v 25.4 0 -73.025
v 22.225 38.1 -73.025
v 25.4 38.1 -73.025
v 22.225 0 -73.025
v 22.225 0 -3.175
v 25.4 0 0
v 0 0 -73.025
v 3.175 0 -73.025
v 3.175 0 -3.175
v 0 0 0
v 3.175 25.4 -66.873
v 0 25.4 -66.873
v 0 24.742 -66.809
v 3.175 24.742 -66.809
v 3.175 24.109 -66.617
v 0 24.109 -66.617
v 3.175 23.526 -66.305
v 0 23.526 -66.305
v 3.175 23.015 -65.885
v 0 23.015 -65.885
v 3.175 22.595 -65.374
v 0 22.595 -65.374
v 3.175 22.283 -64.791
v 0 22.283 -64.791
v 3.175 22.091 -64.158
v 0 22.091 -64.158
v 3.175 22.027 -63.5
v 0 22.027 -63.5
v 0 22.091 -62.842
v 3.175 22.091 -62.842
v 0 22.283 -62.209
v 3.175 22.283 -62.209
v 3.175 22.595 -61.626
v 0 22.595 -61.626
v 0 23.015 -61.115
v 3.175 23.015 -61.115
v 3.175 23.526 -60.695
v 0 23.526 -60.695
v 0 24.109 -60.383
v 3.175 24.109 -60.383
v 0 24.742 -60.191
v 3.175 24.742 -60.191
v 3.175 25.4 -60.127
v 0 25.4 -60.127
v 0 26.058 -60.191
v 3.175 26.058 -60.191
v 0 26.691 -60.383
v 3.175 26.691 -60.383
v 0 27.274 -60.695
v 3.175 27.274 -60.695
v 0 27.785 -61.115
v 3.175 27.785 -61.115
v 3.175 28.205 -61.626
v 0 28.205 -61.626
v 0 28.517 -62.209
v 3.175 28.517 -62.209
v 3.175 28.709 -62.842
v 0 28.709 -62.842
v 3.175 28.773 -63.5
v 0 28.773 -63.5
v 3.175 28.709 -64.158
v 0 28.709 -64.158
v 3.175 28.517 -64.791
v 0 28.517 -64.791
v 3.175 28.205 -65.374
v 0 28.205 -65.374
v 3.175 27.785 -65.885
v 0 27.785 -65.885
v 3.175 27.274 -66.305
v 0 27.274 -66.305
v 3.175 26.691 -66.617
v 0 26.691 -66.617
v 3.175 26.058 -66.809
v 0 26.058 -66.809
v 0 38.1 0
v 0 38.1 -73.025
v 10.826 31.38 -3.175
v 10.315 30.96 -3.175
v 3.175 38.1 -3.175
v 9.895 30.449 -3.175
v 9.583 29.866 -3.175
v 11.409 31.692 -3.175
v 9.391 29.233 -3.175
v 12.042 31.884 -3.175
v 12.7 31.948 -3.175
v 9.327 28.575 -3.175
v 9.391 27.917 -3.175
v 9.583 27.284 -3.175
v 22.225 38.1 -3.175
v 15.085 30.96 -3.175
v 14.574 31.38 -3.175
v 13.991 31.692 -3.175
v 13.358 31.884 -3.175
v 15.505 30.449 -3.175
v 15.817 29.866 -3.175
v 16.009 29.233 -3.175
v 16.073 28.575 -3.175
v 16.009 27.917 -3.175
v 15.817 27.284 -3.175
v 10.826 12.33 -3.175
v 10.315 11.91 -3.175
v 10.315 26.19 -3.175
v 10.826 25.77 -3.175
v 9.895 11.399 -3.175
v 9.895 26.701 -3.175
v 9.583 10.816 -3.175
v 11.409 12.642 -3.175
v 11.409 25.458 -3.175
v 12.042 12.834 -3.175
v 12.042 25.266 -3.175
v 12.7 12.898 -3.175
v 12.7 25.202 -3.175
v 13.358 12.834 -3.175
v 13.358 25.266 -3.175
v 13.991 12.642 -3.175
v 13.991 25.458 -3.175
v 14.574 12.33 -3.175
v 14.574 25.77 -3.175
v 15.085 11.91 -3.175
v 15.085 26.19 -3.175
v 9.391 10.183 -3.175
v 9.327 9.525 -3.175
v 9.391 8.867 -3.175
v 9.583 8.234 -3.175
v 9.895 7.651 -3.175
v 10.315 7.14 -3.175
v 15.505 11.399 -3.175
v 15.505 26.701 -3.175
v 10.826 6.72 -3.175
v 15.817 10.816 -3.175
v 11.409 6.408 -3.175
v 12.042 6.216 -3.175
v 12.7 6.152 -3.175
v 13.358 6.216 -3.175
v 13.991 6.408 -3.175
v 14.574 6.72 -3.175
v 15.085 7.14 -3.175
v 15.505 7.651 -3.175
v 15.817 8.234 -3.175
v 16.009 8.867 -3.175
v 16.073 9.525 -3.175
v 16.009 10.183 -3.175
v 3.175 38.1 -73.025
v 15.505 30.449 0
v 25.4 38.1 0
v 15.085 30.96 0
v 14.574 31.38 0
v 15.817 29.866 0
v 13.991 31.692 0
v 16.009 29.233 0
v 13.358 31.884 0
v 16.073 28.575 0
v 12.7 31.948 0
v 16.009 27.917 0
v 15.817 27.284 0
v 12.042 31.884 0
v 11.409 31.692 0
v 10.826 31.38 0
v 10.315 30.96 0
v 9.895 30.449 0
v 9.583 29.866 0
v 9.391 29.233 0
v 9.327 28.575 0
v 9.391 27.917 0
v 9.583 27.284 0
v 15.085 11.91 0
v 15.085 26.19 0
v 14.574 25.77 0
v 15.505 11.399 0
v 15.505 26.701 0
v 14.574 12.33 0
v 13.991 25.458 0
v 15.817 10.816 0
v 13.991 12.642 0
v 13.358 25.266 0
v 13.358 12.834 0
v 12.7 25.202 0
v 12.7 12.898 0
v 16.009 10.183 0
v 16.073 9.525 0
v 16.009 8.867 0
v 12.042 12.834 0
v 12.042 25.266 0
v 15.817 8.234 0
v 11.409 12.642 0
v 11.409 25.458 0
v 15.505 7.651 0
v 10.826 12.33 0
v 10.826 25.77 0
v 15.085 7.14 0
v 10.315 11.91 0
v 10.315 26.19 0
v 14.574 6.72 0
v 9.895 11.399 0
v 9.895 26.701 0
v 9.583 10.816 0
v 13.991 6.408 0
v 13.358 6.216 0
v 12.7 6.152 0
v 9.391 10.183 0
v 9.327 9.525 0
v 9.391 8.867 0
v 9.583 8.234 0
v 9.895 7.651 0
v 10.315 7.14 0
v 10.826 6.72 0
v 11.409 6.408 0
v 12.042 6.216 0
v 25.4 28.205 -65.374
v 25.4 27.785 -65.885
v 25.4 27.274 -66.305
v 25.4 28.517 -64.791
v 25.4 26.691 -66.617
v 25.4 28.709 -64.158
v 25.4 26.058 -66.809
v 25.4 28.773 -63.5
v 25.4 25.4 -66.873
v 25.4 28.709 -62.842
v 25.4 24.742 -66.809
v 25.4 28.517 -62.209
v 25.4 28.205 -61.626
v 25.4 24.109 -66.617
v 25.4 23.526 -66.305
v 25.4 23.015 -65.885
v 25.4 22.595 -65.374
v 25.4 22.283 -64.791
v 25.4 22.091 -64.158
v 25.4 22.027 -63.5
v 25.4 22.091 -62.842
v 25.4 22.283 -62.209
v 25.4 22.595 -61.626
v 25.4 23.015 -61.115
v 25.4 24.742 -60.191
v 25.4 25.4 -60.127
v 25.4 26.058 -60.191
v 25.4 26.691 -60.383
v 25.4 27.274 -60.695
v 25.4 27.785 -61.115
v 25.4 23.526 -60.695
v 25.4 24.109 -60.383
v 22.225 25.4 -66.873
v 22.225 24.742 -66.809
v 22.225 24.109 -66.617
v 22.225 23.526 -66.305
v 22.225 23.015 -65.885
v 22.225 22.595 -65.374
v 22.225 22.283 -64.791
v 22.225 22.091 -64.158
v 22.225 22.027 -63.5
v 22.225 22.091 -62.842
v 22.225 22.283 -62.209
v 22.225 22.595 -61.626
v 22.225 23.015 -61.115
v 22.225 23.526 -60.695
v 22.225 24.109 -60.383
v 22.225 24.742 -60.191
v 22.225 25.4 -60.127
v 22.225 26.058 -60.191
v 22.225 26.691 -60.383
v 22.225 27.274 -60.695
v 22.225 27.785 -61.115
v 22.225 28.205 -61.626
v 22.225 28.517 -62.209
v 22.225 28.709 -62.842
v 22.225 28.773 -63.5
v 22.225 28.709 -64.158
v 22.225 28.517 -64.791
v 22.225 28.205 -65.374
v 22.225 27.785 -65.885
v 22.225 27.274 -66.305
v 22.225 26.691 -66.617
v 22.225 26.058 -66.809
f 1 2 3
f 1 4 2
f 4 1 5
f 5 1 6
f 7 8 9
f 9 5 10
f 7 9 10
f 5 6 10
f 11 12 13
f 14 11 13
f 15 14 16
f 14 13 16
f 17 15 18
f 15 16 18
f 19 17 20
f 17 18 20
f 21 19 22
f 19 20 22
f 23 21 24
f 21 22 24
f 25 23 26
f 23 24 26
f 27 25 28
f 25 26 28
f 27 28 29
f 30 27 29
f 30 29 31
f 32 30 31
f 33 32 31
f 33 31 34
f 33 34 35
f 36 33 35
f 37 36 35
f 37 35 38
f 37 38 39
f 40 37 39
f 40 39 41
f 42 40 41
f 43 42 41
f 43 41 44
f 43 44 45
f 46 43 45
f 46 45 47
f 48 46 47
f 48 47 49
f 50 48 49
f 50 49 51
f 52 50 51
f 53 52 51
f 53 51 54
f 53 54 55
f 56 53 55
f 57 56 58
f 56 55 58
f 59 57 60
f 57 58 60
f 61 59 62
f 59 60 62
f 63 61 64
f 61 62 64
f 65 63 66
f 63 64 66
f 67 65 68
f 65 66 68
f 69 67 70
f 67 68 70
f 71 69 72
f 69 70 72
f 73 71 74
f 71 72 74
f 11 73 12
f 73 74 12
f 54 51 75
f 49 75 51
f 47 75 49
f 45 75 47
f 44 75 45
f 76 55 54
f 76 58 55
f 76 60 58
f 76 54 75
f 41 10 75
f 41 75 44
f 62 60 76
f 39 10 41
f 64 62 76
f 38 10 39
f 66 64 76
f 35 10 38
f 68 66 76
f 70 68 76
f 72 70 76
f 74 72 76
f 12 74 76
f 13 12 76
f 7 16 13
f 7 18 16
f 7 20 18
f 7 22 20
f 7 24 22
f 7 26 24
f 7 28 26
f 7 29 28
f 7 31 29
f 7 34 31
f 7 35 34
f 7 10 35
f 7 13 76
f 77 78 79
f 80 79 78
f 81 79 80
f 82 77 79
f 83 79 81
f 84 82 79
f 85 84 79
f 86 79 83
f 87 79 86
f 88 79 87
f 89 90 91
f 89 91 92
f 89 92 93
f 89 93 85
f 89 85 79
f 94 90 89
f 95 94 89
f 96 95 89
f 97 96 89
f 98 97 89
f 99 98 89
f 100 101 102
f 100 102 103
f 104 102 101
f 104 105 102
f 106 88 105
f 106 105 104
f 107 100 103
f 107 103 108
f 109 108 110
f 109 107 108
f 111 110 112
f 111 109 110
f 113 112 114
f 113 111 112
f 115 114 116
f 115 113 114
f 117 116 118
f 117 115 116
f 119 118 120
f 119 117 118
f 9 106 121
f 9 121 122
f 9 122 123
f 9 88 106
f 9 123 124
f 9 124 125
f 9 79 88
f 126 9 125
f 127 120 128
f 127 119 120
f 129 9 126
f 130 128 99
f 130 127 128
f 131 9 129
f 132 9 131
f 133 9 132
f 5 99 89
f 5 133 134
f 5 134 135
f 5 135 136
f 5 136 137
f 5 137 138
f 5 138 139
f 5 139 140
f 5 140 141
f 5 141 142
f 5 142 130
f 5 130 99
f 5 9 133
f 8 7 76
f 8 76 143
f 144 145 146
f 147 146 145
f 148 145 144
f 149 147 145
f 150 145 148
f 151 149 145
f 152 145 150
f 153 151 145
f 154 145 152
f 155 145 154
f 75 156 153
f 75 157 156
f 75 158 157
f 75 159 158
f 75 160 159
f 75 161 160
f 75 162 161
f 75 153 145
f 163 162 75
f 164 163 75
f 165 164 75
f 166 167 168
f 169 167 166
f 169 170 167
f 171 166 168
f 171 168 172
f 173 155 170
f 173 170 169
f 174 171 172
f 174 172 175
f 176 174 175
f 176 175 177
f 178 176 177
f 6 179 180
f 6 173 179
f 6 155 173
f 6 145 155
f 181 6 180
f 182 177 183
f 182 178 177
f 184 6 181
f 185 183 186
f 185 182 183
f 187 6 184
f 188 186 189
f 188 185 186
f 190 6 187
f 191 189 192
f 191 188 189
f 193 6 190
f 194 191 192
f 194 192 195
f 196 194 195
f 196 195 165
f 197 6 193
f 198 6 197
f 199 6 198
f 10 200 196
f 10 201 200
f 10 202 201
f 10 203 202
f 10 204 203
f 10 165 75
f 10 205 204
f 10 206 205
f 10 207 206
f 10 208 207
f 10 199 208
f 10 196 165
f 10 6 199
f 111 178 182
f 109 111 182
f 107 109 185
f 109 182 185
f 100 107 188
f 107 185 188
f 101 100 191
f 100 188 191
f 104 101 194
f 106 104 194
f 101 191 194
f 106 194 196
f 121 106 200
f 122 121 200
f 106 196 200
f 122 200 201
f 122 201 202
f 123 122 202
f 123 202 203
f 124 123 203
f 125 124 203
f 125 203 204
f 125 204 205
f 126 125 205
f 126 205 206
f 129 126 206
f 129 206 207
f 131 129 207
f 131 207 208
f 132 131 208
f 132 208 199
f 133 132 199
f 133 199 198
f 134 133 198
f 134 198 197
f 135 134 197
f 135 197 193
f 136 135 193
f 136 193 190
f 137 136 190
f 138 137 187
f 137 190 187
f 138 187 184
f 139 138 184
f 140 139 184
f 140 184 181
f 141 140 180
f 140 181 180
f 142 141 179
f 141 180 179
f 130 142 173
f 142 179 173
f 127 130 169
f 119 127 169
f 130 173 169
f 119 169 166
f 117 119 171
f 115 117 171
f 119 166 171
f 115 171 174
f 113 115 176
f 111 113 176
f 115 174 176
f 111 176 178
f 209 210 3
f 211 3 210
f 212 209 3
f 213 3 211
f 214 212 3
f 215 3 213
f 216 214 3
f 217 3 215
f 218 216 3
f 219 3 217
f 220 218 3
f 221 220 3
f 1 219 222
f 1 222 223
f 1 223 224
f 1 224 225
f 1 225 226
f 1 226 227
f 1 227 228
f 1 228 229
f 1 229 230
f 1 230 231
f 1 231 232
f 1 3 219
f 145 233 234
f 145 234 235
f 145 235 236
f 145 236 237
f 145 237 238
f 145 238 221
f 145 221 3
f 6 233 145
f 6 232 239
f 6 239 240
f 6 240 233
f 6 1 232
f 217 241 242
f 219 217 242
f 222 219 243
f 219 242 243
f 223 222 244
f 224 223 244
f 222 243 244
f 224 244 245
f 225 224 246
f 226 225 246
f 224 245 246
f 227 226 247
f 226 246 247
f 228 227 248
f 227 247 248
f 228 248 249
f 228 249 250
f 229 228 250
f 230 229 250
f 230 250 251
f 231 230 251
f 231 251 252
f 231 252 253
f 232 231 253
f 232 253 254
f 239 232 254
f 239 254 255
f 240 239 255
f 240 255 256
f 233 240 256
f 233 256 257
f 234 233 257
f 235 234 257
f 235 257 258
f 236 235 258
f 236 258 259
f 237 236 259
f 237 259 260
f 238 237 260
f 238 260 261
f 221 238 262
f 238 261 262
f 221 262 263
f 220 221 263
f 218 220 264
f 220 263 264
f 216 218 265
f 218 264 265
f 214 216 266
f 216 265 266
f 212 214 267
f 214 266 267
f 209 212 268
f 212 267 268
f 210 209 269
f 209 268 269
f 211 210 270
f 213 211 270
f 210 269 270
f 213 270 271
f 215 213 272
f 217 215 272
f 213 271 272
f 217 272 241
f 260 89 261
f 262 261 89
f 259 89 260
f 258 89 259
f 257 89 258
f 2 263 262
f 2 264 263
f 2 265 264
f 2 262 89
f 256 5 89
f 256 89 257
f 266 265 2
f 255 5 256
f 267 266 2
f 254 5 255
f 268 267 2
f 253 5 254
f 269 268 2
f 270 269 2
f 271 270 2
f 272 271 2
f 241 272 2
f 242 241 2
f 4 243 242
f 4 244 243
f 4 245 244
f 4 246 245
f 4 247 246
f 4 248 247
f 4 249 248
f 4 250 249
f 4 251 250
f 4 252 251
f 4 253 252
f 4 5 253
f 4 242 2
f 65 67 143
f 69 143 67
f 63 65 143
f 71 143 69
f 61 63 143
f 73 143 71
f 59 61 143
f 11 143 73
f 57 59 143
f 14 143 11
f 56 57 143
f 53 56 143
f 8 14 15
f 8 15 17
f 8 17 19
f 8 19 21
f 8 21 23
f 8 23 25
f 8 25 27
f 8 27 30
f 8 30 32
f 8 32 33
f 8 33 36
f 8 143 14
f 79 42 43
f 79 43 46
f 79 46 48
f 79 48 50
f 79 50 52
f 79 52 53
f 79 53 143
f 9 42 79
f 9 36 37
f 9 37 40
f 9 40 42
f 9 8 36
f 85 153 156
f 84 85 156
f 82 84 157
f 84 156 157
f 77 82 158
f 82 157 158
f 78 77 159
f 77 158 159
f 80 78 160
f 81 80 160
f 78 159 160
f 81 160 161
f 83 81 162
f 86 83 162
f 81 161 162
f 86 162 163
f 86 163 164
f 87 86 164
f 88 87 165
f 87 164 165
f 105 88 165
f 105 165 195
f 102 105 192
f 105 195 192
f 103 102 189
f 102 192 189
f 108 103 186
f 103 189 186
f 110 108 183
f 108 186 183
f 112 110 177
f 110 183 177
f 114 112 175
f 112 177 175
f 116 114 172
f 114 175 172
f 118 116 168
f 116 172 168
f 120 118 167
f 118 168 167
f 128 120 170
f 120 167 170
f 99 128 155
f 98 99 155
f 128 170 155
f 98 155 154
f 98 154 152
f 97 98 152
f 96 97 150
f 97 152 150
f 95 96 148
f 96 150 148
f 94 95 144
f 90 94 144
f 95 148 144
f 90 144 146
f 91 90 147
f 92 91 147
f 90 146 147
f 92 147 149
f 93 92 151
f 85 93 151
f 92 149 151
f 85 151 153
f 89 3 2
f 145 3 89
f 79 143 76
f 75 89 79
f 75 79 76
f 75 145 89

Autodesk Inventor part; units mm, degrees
ref_plane "YZ Plane" through (0, 0, 0) normal (1, 0, 0) x (0, 1, 0)
ref_plane "XZ Plane" through (0, 0, 0) normal (0, 1, 0) x (-1, 0, 0)
ref_plane "XY Plane" through (0, 0, 0) normal (0, 0, 1) x (1, 0, 0)
sketch "Sketch1" plane through (0, 0, 0) normal (0, 1, 0) x (-1, 0, 0)
  line L0 (0, 0) -> (0, -73.025)
  line L1 (0, -73.025) -> (-3.175, -73.025)
  line L2 (-3.175, -73.025) -> (-3.175, -3.175)
  line L3 (-3.175, -3.175) -> (-22.225, -3.175)
  line L4 (-22.225, -3.175) -> (-22.225, -73.025)
  line L5 (-22.225, -73.025) -> (-25.4, -73.025)
  line L6 (-25.4, -73.025) -> (-25.4, 0)
  line L7 (-25.4, 0) -> (0, 0)
  dimension "d0" = 3.175
  dimension "d1" = 73.025
  dimension "d2" = 3.175
  dimension "d3" = 25.4
  dimension "d4" = 3.175
extrude "Extrusion1" add sketch "Sketch1" along normal blind 38.1
sketch "Sketch2" plane through (25.4, 0, 0) normal (1, 0, 0) x (0, 0, -1)
  line L0 (73.025, 0) -> (73.025, 38.1) projected
  line L1 (73.025, 0) -> (0, 0) projected
  point P0 (63.5, 25.4)
  dimension "d7" = 9.525
  dimension "d8" = 25.4
hole "Hole1" at (25.4, 25.4, -63.5) direction (-1, 0, 0) diameter 6.7469 end through all
sketch "Sketch3" plane through (22.225, 0, -3.175) normal (0, 0, -1) x (-1, 0, 0)
  line L0 (-3.175, 0) -> (22.225, 0) projected
  line L1 (0, 38.1) -> (19.05, 38.1) projected
  line L2 (22.225, 0) -> (22.225, 38.1) projected
  line L3 (-3.175, 0) -> (-3.175, 38.1) projected
  point P0 (9.525, 9.525)
  point P1 (9.525, 28.575)
  point P2 (22.225, 31.75)
  point P3 (-3.175, 31.75)
  dimension "d19" = 9.525
  dimension "d20" = 9.525
  dimension "d21" = 12.7
  dimension "d22" = 12.7
hole "Hole2" at (12.7, 9.525, -3.175) at (12.7, 28.575, -3.175) direction (0, 0, 1) diameter 6.7469 end through all
properties part number "15102898-16-P-0311" material "Aluminum 6061"
